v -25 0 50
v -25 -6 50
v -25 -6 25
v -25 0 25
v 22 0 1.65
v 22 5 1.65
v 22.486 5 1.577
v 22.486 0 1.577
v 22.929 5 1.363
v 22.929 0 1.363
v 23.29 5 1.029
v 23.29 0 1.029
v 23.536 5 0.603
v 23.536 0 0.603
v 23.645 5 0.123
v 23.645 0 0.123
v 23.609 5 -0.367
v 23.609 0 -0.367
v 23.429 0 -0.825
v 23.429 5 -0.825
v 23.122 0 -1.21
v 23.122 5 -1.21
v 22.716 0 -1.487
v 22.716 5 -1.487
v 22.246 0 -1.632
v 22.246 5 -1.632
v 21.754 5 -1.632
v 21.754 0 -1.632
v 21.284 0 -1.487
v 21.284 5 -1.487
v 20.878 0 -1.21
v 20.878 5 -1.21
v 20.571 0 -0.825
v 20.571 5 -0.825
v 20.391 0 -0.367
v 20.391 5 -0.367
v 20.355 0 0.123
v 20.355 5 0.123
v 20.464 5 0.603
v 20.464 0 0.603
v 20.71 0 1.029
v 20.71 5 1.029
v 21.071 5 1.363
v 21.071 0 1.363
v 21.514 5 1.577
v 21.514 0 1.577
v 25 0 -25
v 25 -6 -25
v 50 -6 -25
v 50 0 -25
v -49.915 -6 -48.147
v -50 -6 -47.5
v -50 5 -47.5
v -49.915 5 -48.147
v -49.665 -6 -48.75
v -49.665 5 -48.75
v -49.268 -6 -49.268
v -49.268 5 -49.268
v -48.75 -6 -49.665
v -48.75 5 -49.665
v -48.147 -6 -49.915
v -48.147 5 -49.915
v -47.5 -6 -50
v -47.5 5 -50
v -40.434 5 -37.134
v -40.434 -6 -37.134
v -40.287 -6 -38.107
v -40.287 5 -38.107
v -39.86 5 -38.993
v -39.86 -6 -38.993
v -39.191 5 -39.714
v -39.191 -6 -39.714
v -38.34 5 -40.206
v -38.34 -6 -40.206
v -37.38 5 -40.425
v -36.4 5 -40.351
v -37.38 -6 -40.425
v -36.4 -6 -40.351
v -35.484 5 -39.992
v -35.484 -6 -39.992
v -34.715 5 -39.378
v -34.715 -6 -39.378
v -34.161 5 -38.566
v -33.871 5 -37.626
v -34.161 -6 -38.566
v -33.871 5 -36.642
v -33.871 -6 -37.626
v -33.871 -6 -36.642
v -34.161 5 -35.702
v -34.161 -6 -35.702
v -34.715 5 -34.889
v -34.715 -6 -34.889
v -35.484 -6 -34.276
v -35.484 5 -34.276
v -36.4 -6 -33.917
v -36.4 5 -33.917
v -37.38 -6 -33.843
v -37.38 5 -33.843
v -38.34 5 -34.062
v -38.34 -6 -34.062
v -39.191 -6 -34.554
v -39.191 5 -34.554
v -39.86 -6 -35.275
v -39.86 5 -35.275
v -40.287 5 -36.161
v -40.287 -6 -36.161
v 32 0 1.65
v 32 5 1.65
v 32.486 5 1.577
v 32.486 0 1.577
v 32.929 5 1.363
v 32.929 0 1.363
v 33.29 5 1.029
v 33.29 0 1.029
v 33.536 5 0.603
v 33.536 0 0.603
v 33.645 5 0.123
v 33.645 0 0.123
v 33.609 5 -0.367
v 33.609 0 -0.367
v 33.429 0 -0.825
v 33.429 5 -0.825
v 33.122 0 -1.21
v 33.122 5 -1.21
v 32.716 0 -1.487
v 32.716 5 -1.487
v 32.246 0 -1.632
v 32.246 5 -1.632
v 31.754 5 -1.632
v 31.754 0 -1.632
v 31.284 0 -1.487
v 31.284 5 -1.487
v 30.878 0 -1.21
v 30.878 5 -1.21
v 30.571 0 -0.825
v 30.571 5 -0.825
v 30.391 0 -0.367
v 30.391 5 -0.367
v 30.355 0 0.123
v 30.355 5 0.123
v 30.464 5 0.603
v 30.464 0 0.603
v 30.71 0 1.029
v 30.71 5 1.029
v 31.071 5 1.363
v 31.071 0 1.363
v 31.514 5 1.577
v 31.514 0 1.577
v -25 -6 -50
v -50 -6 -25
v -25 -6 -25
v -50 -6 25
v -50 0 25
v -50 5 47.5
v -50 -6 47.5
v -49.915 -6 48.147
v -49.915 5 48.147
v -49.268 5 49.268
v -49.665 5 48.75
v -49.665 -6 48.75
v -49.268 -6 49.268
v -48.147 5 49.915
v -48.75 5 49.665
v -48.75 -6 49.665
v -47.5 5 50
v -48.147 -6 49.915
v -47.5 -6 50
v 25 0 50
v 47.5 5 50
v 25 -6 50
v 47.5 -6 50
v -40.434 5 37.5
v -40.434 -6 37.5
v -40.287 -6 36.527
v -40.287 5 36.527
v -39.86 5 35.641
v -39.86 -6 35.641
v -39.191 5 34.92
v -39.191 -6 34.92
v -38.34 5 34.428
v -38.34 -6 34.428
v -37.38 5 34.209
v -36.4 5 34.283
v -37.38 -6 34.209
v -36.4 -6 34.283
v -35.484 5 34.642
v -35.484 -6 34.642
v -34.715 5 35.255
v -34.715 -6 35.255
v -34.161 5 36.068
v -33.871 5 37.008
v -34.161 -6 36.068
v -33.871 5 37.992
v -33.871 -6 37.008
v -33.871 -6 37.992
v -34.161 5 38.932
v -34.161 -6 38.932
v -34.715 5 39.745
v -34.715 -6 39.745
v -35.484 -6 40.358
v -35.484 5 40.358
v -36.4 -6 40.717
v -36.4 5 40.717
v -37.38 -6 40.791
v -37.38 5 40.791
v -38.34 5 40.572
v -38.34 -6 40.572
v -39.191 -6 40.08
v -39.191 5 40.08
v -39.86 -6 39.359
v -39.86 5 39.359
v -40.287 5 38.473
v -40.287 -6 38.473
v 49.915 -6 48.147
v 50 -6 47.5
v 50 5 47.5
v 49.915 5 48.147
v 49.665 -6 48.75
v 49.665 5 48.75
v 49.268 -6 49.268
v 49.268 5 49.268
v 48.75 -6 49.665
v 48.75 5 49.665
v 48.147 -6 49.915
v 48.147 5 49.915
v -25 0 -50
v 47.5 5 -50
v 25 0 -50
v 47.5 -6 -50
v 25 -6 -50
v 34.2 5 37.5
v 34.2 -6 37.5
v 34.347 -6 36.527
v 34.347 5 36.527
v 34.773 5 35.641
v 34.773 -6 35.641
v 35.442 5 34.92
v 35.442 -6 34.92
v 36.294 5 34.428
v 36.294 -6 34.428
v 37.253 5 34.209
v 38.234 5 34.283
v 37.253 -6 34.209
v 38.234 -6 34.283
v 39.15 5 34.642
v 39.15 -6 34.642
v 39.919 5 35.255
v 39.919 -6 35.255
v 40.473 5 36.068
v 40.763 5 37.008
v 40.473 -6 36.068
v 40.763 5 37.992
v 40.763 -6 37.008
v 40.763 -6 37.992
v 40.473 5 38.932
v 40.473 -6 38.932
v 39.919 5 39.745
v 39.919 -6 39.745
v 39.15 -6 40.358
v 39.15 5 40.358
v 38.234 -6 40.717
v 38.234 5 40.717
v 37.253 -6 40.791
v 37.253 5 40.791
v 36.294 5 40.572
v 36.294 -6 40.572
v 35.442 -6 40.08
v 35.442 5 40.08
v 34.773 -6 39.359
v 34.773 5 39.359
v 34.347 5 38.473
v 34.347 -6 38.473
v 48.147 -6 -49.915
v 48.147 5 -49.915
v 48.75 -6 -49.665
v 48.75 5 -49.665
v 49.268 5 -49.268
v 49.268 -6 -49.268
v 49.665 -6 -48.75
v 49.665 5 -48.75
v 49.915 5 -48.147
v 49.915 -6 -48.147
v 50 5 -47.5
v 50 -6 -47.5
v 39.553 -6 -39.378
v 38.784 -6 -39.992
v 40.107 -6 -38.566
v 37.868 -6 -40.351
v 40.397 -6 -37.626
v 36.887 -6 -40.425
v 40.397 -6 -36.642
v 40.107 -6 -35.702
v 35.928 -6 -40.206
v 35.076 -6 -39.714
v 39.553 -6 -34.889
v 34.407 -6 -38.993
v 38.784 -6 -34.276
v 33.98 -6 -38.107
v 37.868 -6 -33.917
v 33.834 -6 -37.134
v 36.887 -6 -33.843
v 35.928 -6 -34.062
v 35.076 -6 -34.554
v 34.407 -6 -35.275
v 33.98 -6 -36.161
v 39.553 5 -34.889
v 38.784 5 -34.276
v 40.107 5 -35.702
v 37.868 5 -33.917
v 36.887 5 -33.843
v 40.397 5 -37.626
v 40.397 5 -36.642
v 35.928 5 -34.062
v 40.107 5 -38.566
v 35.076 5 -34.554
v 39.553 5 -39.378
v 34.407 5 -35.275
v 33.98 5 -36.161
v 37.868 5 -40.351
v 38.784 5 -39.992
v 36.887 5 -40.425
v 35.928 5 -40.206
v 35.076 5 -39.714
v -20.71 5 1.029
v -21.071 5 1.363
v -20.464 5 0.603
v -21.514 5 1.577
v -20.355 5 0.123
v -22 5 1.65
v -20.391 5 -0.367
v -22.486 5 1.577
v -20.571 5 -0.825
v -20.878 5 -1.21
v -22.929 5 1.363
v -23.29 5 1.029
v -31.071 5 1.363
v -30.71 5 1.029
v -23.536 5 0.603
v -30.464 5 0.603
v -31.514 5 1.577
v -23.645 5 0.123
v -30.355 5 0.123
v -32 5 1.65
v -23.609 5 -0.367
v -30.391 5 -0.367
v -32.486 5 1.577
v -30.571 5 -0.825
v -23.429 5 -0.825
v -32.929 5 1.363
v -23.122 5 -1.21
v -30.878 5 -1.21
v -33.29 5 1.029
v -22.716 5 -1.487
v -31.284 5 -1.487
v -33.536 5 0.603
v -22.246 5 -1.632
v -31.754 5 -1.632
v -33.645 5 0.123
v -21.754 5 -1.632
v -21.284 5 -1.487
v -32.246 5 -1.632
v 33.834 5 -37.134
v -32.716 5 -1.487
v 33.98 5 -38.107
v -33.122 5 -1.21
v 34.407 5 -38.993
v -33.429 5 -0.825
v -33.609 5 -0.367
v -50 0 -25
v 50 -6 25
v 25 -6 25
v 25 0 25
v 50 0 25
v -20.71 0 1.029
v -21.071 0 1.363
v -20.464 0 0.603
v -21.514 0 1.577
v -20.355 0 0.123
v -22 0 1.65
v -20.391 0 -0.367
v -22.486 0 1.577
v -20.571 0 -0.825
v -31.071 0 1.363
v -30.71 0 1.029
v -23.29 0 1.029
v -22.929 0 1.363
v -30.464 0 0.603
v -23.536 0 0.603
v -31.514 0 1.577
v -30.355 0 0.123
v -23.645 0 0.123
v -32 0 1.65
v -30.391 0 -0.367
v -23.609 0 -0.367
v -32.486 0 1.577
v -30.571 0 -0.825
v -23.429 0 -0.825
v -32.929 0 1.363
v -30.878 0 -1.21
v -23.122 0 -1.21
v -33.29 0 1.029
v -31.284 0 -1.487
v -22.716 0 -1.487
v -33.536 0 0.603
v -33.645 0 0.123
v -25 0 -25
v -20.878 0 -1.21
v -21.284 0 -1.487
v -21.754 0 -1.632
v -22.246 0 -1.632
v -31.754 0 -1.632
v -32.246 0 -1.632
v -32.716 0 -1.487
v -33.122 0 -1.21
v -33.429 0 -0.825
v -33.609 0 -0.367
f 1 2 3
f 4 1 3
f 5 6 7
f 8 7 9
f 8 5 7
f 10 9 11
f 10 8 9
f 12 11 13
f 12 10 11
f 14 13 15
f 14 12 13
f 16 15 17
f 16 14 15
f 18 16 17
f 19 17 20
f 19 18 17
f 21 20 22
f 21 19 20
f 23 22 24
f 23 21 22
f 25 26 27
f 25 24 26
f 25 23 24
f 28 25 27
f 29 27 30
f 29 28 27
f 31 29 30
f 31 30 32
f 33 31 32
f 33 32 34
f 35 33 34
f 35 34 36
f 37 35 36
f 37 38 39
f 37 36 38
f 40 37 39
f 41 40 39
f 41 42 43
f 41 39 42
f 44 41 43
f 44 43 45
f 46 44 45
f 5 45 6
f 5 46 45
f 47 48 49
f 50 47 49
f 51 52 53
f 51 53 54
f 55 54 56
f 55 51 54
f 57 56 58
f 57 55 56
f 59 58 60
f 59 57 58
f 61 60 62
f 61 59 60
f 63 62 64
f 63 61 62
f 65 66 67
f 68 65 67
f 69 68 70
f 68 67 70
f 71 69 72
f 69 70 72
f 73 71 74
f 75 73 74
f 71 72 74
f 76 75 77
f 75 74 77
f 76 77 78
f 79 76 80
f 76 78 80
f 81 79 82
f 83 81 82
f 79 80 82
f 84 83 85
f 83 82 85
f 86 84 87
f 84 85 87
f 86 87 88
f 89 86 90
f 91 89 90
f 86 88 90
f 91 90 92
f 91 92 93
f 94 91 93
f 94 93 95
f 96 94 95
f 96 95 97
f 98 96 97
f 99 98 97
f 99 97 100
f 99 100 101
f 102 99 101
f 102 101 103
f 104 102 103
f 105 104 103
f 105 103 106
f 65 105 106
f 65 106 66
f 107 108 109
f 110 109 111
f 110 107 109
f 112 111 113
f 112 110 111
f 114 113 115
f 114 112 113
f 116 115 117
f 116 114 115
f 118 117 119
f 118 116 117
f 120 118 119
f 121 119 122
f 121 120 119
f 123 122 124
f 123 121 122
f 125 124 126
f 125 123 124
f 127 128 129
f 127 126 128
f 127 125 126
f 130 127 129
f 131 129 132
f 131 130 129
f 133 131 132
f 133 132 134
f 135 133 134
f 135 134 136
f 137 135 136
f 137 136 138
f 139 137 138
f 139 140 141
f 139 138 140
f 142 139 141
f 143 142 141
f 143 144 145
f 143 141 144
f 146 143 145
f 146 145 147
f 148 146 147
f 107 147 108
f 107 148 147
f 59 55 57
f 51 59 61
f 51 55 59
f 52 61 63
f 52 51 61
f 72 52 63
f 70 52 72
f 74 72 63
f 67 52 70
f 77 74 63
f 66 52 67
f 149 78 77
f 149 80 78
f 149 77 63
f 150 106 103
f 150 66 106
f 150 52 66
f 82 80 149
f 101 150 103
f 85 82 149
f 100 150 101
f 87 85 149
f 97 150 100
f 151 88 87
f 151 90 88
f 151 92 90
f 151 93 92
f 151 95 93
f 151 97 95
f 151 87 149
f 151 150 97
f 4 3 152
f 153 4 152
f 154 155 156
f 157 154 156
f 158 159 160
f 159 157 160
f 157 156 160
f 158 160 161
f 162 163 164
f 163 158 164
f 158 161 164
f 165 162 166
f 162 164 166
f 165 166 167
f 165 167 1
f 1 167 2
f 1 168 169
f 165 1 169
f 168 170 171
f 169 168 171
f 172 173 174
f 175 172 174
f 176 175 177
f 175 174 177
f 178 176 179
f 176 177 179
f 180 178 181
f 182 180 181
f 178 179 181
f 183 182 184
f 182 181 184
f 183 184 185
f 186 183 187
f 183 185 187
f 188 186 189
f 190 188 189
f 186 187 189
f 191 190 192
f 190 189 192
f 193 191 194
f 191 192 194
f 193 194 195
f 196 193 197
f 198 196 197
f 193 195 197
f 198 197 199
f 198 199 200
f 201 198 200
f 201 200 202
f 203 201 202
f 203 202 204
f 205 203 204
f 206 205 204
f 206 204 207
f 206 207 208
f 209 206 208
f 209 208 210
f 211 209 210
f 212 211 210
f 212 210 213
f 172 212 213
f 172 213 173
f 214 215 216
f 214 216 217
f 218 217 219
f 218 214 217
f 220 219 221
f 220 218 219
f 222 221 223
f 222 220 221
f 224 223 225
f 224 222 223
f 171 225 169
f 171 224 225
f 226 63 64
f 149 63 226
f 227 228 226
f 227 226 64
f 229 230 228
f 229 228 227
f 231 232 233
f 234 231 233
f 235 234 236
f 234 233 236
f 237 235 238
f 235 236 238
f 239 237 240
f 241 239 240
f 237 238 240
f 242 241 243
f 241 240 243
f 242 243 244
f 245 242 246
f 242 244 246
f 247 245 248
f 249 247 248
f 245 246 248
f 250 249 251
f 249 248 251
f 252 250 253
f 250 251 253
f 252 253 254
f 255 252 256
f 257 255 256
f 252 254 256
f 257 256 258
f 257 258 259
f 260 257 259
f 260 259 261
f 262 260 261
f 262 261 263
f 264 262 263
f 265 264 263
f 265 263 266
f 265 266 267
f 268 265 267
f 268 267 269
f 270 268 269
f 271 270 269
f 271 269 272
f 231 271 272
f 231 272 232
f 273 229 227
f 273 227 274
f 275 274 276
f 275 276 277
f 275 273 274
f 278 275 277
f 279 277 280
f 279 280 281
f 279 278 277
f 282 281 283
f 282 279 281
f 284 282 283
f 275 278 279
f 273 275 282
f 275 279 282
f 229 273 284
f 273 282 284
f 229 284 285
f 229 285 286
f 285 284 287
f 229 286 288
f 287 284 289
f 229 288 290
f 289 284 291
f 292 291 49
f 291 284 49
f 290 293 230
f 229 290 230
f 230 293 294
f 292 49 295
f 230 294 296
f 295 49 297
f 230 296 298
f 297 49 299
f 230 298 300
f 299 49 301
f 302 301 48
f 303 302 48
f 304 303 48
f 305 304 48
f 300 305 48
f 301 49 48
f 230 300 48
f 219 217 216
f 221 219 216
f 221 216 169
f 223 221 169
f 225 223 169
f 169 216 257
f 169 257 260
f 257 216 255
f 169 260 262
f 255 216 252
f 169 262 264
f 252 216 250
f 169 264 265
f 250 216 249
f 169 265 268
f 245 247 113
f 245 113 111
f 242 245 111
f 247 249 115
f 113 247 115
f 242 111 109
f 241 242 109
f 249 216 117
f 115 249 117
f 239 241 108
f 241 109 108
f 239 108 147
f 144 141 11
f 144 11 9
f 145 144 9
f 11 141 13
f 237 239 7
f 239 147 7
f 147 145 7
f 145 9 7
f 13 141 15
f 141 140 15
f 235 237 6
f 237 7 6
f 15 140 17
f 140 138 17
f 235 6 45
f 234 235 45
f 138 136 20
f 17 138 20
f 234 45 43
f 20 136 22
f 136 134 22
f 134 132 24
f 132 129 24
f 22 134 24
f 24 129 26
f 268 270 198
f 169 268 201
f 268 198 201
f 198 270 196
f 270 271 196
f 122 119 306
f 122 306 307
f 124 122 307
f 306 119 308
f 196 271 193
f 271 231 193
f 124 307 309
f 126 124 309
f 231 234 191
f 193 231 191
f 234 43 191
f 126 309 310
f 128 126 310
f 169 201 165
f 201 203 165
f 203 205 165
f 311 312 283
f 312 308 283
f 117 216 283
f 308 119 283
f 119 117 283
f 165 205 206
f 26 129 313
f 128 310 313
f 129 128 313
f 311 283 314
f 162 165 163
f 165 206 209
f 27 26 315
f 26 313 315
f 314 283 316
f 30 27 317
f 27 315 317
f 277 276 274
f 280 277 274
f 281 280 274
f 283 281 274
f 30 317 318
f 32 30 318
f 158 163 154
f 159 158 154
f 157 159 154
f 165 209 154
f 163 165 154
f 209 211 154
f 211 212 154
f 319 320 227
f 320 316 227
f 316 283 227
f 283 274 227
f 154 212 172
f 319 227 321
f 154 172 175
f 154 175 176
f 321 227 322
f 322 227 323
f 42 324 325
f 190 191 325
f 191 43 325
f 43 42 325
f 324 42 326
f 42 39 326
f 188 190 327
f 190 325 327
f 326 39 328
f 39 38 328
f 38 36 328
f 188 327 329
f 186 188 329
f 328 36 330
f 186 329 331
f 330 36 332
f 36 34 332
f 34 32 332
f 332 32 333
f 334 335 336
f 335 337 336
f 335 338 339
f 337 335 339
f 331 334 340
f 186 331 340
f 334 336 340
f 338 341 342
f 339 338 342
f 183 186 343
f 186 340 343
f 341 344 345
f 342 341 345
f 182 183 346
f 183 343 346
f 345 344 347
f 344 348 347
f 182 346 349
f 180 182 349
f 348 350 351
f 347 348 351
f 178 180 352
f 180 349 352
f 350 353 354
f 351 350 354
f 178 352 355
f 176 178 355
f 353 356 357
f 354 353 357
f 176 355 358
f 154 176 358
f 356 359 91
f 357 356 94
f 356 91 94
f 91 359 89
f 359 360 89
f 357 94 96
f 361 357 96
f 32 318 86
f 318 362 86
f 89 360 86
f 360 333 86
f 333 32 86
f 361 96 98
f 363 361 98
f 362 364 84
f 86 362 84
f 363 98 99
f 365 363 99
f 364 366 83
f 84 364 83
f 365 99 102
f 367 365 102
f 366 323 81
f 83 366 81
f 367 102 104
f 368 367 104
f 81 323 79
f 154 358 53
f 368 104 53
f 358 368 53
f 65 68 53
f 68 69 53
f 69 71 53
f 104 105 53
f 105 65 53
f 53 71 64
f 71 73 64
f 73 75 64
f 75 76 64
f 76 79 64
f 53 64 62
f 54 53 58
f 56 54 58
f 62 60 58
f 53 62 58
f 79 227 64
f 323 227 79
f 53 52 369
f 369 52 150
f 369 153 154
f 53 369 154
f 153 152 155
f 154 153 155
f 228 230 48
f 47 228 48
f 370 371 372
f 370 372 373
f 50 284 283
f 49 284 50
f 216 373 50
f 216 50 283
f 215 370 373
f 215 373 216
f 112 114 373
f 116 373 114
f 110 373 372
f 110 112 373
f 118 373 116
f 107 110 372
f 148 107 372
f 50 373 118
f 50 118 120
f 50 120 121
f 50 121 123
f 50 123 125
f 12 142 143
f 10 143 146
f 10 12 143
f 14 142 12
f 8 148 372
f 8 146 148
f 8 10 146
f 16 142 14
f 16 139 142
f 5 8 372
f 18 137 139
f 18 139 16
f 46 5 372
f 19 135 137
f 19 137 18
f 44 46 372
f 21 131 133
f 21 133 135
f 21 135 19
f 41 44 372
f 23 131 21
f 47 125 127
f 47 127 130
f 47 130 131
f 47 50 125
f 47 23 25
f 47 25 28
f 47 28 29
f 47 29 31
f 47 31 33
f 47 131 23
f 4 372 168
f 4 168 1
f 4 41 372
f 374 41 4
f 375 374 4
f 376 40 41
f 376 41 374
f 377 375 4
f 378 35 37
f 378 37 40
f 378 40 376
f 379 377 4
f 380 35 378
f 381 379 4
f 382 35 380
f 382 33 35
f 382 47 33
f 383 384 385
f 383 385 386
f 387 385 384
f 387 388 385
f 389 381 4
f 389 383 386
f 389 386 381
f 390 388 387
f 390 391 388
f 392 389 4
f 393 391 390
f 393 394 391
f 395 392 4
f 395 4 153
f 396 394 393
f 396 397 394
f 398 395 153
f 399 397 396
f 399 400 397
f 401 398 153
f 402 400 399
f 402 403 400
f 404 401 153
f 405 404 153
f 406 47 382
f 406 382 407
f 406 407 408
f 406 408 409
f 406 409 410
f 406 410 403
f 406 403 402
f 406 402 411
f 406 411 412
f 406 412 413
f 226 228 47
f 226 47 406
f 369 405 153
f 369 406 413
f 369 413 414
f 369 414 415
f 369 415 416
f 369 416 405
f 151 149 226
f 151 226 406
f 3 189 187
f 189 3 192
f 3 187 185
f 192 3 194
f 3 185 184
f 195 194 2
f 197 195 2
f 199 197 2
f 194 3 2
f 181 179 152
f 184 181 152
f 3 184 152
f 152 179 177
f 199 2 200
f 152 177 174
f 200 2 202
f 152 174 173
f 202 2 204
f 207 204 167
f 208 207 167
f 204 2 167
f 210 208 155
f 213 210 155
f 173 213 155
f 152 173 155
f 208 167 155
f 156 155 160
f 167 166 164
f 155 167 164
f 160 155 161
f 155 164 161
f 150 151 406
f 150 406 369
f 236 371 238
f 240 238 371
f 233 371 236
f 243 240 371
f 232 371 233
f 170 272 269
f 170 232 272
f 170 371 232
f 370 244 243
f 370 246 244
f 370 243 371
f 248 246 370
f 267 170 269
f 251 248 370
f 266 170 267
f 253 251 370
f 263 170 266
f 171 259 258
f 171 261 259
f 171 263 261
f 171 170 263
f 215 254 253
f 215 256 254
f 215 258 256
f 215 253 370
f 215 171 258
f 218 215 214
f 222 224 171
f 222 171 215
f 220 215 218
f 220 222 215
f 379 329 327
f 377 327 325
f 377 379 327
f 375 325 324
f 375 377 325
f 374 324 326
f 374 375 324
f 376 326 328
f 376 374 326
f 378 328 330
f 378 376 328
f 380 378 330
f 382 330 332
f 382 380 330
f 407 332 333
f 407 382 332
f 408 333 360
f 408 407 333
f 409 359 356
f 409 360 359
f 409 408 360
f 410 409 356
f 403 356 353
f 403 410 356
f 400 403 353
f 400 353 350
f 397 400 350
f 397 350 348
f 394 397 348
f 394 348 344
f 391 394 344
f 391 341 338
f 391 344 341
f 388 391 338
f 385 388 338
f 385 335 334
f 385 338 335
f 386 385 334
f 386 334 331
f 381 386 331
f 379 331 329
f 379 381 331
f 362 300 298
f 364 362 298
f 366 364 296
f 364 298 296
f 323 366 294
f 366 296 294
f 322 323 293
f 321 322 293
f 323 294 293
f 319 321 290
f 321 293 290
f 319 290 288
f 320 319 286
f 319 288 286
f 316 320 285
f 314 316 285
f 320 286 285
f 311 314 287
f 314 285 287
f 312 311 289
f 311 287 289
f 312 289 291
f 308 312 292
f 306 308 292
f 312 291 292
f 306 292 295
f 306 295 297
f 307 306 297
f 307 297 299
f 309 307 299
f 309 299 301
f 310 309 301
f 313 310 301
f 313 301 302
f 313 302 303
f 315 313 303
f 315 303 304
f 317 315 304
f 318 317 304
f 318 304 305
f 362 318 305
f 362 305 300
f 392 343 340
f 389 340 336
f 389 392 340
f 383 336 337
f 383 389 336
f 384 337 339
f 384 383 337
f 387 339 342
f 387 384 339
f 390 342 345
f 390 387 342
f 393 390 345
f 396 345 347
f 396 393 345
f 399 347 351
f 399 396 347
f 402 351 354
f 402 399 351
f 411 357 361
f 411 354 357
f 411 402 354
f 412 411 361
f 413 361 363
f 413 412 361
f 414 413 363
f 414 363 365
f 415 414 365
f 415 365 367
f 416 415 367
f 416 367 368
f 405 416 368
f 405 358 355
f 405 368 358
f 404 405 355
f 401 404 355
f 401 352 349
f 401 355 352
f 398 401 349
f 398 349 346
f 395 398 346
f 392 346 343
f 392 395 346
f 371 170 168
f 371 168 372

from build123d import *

# Parameters (mm, degrees)
BOSS_EXTRUDE1_DEPTH  = 5
BOSS_EXTRUDE2_START  = 6
BOSS_EXTRUDE2_DEPTH  = 6
SKETCH1_3_R          = 1.65
CUT_EXTRUDE1_DEPTH   = 71.964779997
M6_CLEARANCE_HOLE2_D = 6.6


with BuildPart() as part:
    # Sketch1 → Boss-Extrude1 (new body)
    with BuildSketch(Plane(origin=(0, 0, 0), x_dir=(1, 0, 0), z_dir=(0, 1, 0))):
        with BuildLine():
            Line((-47.5, 50), (47.5, 50))
            ThreePointArc((47.5, 50), (49.267766953, 49.267766953), (50, 47.5))
            Line((50, 47.5), (50, -47.5))
            ThreePointArc((50, -47.5), (49.267766953, -49.267766953), (47.5, -50))
            Line((47.5, -50), (-47.5, -50))
            ThreePointArc((-47.5, -50), (-49.267766953, -49.267766953), (-50, -47.5))
            Line((-50, -47.5), (-50, 47.5))
            ThreePointArc((-50, 47.5), (-49.267766953, 49.267766953), (-47.5, 50))
        make_face()
    extrude(amount=BOSS_EXTRUDE1_DEPTH)

    # Sketch2 → Boss-Extrude2 (add)
    with BuildSketch(Plane.XZ.offset(BOSS_EXTRUDE2_START)):
        with BuildLine():
            Line((-25, 25), (-50, 25))
            Line((-50, 25), (-50, 47.5))
            ThreePointArc((-50, 47.5), (-49.267766953, 49.267766953), (-47.5, 50))
            Line((-47.5, 50), (-25, 50))
            Line((-25, 50), (-25, 25))
        make_face()
        with BuildLine():
            Line((25, 25), (50, 25))
            Line((50, 25), (50, 47.5))
            ThreePointArc((50, 47.5), (49.267766953, 49.267766953), (47.5, 50))
            Line((47.5, 50), (25, 50))
            Line((25, 50), (25, 25))
        make_face()
        with BuildLine():
            Line((25, -25), (50, -25))
            Line((50, -25), (50, -47.5))
            ThreePointArc((50, -47.5), (49.267766953, -49.267766953), (47.5, -50))
            Line((47.5, -50), (25, -50))
            Line((25, -50), (25, -25))
        make_face()
        with BuildLine():
            Line((-25, -25), (-50, -25))
            Line((-50, -25), (-50, -47.5))
            ThreePointArc((-50, -47.5), (-49.267766953, -49.267766953), (-47.5, -50))
            Line((-47.5, -50), (-25, -50))
            Line((-25, -50), (-25, -25))
        make_face()
    extrude(amount=-BOSS_EXTRUDE2_DEPTH)

    # Sketch1<3> → Cut-Extrude1 (cut, through all)
    with BuildSketch(Plane(origin=(0, 0, 0), x_dir=(1, 0, 0), z_dir=(0, 1, 0))):
        with Locations((-32, 0)):
            Circle(SKETCH1_3_R)
        with Locations((-22, 0)):
            Circle(SKETCH1_3_R)
        with Locations((22, 0)):
            Circle(SKETCH1_3_R)
        with Locations((32, 0)):
            Circle(SKETCH1_3_R)
    extrude(amount=CUT_EXTRUDE1_DEPTH, mode=Mode.SUBTRACT)

    # M6 Clearance Hole2 (through all)
    with Locations(Plane(origin=(0, 5, 0), x_dir=(1, 0, 0), z_dir=(0, 1, 0))):
        with Locations((-37.133883476, 37.133883476), (37.5, -37.5), (-37.133883476, -37.5), (37.133883476, 37.133883476)):
            Hole(M6_CLEARANCE_HOLE2_D / 2)


solid = part.part
